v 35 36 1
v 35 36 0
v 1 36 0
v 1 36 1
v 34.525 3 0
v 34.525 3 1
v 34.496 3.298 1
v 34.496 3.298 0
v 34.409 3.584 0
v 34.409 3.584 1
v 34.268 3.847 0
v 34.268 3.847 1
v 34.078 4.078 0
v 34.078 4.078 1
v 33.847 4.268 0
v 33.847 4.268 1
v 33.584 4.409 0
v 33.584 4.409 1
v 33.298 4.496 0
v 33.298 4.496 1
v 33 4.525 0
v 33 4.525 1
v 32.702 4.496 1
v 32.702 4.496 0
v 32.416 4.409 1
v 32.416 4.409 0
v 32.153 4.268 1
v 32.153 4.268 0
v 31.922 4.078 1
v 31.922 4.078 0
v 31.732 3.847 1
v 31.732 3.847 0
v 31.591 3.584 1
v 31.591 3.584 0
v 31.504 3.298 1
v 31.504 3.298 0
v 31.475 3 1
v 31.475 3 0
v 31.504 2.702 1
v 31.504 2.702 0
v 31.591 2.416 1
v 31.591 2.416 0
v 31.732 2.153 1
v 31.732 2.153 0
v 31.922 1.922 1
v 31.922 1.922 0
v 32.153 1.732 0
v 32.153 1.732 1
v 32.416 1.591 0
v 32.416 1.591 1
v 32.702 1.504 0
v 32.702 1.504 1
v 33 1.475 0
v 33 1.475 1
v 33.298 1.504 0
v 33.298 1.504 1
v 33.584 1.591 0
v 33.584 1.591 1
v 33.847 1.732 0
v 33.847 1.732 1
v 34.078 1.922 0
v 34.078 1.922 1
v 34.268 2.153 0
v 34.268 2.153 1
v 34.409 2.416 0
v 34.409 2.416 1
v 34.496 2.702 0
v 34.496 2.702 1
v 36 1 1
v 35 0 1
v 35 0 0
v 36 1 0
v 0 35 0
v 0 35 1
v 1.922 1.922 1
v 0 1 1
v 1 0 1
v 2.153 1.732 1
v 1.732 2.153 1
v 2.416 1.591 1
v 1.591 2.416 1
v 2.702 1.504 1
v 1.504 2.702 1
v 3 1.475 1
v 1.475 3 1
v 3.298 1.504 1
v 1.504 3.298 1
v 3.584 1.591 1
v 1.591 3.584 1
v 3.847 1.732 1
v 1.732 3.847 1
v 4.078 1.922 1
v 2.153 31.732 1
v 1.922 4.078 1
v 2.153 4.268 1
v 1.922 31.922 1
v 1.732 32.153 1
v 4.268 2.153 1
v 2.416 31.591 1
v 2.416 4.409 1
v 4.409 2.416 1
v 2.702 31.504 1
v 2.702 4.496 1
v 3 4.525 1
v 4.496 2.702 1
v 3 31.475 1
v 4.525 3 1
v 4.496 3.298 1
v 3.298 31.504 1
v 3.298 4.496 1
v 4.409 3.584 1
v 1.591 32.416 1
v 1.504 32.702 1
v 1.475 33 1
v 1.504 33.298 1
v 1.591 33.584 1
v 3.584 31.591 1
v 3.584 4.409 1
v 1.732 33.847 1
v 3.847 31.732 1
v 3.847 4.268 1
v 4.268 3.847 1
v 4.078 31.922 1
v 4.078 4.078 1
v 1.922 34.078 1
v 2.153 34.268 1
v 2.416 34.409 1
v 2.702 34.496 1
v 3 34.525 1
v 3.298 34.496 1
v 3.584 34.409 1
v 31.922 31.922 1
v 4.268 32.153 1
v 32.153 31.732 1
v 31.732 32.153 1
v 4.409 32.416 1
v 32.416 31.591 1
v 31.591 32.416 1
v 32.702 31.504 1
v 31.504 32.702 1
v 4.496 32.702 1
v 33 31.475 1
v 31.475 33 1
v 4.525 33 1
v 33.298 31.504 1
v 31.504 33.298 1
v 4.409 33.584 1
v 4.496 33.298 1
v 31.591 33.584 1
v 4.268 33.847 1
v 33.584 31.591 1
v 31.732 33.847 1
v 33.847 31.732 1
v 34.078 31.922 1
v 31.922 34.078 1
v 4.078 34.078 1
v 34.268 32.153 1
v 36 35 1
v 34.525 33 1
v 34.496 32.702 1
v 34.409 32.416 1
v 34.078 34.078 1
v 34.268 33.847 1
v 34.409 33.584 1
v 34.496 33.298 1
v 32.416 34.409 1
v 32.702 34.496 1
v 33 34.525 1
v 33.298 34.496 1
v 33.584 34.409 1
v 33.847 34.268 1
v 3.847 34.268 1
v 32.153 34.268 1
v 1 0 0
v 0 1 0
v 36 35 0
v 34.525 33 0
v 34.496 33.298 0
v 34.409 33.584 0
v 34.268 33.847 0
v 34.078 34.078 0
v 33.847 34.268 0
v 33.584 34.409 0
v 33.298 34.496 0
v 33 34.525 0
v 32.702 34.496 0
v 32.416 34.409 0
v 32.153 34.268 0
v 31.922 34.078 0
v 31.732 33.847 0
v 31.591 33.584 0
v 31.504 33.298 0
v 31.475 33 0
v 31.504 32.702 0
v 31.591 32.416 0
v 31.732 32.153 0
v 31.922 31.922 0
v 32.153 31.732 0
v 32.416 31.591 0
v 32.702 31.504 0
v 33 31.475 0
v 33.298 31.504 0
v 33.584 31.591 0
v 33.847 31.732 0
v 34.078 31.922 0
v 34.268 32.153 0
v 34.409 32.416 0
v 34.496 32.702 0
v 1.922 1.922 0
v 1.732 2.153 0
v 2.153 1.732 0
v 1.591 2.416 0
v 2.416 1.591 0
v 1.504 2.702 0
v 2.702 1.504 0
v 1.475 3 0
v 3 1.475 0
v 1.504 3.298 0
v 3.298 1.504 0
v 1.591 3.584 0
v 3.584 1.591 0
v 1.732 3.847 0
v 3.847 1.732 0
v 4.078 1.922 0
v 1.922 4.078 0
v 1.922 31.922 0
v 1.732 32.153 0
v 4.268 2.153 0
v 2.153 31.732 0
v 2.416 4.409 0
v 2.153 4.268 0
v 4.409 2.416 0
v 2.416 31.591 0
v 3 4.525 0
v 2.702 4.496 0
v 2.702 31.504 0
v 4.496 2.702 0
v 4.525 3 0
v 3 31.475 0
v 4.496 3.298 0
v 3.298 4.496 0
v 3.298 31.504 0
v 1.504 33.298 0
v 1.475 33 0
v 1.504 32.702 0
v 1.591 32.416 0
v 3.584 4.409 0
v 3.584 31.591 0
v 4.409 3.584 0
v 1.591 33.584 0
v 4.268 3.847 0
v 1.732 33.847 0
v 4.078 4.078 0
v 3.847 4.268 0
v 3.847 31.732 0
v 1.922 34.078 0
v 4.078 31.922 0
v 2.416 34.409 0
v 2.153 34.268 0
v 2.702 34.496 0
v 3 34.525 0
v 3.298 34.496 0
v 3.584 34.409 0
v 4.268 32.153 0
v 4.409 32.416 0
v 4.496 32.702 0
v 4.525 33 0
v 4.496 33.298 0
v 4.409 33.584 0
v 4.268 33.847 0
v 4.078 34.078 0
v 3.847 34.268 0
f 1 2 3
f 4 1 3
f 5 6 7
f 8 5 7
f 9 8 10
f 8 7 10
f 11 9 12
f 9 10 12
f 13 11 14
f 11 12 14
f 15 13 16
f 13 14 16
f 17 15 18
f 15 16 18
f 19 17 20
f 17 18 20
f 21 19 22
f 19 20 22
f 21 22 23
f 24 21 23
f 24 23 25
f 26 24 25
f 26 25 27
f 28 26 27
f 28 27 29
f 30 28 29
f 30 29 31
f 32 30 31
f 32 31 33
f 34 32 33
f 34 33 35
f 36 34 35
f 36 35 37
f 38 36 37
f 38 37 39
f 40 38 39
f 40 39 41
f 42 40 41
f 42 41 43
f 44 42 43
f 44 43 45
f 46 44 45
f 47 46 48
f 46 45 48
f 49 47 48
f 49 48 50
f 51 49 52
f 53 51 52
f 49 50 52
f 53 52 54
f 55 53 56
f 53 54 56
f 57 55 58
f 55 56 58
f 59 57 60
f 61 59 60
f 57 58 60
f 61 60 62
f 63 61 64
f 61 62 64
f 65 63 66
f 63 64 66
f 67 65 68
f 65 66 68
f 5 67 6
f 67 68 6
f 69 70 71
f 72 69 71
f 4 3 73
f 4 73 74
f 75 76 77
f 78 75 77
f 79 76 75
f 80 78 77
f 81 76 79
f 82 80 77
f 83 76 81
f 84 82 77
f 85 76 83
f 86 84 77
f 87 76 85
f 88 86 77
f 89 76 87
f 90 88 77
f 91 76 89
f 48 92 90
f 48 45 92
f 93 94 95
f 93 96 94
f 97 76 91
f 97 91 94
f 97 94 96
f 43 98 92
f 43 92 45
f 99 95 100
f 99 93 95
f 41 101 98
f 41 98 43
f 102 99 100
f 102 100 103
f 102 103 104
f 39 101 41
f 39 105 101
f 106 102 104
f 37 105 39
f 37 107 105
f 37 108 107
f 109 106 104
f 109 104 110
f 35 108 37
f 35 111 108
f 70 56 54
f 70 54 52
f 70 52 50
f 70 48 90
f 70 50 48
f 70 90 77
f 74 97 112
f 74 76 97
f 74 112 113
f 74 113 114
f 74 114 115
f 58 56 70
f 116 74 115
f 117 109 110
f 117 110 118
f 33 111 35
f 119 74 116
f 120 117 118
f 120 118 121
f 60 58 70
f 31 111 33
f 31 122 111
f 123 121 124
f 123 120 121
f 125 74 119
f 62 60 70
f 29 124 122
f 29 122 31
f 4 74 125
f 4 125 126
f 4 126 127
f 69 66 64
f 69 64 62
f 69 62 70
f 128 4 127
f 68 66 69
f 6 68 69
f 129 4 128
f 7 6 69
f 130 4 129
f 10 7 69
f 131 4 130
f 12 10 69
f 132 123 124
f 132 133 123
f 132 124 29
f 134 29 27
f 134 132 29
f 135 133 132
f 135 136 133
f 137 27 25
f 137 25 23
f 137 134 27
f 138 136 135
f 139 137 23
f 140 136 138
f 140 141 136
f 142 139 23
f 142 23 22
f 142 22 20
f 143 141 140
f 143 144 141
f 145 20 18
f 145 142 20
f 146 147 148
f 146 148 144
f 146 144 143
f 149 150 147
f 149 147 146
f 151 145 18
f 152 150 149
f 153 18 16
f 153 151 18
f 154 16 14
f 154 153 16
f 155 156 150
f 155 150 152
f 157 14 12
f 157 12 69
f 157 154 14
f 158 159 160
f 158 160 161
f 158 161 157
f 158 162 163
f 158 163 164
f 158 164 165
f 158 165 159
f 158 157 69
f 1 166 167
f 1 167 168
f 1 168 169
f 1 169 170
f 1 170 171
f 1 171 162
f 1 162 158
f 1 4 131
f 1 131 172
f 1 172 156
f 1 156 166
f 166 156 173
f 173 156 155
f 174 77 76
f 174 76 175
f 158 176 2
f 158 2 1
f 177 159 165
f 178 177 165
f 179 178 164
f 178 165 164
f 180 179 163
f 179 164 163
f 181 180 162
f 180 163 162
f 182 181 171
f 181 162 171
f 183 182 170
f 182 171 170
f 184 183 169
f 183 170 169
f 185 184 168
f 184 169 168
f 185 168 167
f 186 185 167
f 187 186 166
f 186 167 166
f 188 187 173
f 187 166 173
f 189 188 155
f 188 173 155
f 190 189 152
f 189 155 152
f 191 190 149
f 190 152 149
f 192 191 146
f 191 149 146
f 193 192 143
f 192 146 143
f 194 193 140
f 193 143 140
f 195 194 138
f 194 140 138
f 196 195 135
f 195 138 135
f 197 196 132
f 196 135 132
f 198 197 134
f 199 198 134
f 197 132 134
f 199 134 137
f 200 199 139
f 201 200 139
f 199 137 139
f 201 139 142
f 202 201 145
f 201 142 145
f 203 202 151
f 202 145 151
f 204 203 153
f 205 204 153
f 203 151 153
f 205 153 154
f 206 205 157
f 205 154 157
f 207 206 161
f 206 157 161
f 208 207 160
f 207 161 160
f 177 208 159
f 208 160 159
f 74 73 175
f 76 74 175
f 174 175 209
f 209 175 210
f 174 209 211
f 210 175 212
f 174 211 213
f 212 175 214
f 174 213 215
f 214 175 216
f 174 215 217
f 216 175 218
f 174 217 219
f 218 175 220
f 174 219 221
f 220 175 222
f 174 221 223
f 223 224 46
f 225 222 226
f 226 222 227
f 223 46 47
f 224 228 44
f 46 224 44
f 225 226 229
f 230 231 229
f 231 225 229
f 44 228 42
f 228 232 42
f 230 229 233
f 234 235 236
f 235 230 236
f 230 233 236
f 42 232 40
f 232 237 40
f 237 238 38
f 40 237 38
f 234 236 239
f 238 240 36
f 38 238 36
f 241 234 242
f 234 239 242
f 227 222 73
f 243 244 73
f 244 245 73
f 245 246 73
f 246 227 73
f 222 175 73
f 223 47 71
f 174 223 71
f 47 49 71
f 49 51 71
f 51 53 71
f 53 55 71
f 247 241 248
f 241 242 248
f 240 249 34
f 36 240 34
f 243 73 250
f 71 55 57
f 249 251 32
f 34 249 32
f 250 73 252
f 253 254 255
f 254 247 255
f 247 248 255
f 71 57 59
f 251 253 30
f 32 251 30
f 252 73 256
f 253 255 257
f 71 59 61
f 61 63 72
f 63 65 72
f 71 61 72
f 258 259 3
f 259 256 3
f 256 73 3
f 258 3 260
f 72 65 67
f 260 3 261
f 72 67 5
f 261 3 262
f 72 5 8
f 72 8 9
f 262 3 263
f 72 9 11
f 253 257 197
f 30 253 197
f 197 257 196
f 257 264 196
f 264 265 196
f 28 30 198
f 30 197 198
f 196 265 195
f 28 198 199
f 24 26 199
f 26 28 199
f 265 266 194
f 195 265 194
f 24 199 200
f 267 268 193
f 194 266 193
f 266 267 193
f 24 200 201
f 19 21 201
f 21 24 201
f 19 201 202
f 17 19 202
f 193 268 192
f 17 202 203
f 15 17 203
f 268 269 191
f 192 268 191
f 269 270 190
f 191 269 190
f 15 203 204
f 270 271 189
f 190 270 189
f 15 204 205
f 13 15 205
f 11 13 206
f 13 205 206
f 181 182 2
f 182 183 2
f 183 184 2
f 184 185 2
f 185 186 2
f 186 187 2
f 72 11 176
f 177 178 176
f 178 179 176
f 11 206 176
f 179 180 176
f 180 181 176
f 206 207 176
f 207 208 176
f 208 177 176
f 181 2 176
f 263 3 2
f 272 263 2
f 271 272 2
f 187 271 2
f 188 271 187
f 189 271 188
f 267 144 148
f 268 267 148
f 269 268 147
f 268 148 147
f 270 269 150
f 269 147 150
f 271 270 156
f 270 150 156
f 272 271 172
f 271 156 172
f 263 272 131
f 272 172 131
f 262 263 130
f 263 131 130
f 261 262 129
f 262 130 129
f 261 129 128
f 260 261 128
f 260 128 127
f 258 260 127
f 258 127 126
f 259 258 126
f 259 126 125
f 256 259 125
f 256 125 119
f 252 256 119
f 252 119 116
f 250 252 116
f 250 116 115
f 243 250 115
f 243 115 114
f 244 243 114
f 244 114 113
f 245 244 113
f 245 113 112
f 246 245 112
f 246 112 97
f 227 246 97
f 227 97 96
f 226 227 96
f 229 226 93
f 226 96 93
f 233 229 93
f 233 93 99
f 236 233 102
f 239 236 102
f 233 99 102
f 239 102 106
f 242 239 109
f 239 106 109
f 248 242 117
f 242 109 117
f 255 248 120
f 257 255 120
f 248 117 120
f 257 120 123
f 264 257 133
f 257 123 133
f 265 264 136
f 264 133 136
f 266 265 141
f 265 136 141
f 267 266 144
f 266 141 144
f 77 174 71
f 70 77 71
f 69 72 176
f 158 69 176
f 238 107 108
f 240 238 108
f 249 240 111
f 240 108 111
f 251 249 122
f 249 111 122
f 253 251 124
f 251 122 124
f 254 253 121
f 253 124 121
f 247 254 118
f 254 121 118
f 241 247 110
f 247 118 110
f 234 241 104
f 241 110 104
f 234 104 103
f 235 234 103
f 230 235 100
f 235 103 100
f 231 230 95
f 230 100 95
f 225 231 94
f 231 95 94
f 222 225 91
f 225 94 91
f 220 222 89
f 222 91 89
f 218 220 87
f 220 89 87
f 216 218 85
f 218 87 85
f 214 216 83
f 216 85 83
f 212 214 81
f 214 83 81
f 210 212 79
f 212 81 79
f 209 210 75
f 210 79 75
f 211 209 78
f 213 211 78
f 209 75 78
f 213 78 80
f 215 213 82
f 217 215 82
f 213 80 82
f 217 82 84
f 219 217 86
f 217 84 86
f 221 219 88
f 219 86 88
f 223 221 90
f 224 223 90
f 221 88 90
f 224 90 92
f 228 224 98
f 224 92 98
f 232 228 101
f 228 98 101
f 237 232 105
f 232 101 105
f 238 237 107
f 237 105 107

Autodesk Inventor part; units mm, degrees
ref_plane "YZ Plane" through (0, 0, 0) normal (1, 0, 0) x (0, 1, 0)
ref_plane "XZ Plane" through (0, 0, 0) normal (0, 1, 0) x (-1, 0, 0)
ref_plane "XY Plane" through (0, 0, 0) normal (0, 0, 1) x (1, 0, 0)
sketch "Sketch1" plane through (0, 0, 0) normal (0, 0, 1) x (1, 0, 0)
  line L0 (0, 0) -> (36, 0)
  line L1 (36, 0) -> (36, 36)
  line L2 (36, 36) -> (0, 36)
  line L3 (0, 36) -> (0, 0)
  dimension "d0" = 36
  dimension "d1" = 36
extrude "Extrusion1" add sketch "Sketch1" along normal blind 1
sketch "Sketch2" plane through (0, 0, 1) normal (0, 0, 1) x (1, 0, 0)
  line L0 (3, 33) -> (33, 33)
  line L1 (33, 33) -> (33, 3)
  line L2 (33, 3) -> (3, 3)
  line L3 (3, 3) -> (3, 33)
  line L4 (0, 36) -> (0, 0) projected
  line L5 (36, 36) -> (0, 36) projected
  circle A0 centre (3, 33) radius 1.525
  circle A1 centre (33, 33) radius 1.525
  circle A2 centre (33, 3) radius 1.525
  circle A3 centre (3, 3) radius 1.525
  dimension "d4" = 30
  dimension "d5" = 30
  dimension "d6" = 3
  dimension "d7" = 3
  dimension "d8" = 3.05
  dimension "d9" = 3.05
  dimension "d10" = 3.05
  dimension "d11" = 3.05
extrude "Extrusion2" cut sketch "Sketch2" against normal through all contours L3 A0 L0 | L0 A0 L3 | A1 L1 L0 | L0 L1 A1 | A3 L2 L3 | L3 L2 A3 | A2 L2 L1 | L1 L2 A2
chamfer "Chamfer1" distance 1 angle 45 4 edges at (0, 36, 0.5) (36, 36, 0.5) (36, 0, 0.5) (0, 0, 0.5)
properties part number "Matek Systems PDU" material "GFRC"
